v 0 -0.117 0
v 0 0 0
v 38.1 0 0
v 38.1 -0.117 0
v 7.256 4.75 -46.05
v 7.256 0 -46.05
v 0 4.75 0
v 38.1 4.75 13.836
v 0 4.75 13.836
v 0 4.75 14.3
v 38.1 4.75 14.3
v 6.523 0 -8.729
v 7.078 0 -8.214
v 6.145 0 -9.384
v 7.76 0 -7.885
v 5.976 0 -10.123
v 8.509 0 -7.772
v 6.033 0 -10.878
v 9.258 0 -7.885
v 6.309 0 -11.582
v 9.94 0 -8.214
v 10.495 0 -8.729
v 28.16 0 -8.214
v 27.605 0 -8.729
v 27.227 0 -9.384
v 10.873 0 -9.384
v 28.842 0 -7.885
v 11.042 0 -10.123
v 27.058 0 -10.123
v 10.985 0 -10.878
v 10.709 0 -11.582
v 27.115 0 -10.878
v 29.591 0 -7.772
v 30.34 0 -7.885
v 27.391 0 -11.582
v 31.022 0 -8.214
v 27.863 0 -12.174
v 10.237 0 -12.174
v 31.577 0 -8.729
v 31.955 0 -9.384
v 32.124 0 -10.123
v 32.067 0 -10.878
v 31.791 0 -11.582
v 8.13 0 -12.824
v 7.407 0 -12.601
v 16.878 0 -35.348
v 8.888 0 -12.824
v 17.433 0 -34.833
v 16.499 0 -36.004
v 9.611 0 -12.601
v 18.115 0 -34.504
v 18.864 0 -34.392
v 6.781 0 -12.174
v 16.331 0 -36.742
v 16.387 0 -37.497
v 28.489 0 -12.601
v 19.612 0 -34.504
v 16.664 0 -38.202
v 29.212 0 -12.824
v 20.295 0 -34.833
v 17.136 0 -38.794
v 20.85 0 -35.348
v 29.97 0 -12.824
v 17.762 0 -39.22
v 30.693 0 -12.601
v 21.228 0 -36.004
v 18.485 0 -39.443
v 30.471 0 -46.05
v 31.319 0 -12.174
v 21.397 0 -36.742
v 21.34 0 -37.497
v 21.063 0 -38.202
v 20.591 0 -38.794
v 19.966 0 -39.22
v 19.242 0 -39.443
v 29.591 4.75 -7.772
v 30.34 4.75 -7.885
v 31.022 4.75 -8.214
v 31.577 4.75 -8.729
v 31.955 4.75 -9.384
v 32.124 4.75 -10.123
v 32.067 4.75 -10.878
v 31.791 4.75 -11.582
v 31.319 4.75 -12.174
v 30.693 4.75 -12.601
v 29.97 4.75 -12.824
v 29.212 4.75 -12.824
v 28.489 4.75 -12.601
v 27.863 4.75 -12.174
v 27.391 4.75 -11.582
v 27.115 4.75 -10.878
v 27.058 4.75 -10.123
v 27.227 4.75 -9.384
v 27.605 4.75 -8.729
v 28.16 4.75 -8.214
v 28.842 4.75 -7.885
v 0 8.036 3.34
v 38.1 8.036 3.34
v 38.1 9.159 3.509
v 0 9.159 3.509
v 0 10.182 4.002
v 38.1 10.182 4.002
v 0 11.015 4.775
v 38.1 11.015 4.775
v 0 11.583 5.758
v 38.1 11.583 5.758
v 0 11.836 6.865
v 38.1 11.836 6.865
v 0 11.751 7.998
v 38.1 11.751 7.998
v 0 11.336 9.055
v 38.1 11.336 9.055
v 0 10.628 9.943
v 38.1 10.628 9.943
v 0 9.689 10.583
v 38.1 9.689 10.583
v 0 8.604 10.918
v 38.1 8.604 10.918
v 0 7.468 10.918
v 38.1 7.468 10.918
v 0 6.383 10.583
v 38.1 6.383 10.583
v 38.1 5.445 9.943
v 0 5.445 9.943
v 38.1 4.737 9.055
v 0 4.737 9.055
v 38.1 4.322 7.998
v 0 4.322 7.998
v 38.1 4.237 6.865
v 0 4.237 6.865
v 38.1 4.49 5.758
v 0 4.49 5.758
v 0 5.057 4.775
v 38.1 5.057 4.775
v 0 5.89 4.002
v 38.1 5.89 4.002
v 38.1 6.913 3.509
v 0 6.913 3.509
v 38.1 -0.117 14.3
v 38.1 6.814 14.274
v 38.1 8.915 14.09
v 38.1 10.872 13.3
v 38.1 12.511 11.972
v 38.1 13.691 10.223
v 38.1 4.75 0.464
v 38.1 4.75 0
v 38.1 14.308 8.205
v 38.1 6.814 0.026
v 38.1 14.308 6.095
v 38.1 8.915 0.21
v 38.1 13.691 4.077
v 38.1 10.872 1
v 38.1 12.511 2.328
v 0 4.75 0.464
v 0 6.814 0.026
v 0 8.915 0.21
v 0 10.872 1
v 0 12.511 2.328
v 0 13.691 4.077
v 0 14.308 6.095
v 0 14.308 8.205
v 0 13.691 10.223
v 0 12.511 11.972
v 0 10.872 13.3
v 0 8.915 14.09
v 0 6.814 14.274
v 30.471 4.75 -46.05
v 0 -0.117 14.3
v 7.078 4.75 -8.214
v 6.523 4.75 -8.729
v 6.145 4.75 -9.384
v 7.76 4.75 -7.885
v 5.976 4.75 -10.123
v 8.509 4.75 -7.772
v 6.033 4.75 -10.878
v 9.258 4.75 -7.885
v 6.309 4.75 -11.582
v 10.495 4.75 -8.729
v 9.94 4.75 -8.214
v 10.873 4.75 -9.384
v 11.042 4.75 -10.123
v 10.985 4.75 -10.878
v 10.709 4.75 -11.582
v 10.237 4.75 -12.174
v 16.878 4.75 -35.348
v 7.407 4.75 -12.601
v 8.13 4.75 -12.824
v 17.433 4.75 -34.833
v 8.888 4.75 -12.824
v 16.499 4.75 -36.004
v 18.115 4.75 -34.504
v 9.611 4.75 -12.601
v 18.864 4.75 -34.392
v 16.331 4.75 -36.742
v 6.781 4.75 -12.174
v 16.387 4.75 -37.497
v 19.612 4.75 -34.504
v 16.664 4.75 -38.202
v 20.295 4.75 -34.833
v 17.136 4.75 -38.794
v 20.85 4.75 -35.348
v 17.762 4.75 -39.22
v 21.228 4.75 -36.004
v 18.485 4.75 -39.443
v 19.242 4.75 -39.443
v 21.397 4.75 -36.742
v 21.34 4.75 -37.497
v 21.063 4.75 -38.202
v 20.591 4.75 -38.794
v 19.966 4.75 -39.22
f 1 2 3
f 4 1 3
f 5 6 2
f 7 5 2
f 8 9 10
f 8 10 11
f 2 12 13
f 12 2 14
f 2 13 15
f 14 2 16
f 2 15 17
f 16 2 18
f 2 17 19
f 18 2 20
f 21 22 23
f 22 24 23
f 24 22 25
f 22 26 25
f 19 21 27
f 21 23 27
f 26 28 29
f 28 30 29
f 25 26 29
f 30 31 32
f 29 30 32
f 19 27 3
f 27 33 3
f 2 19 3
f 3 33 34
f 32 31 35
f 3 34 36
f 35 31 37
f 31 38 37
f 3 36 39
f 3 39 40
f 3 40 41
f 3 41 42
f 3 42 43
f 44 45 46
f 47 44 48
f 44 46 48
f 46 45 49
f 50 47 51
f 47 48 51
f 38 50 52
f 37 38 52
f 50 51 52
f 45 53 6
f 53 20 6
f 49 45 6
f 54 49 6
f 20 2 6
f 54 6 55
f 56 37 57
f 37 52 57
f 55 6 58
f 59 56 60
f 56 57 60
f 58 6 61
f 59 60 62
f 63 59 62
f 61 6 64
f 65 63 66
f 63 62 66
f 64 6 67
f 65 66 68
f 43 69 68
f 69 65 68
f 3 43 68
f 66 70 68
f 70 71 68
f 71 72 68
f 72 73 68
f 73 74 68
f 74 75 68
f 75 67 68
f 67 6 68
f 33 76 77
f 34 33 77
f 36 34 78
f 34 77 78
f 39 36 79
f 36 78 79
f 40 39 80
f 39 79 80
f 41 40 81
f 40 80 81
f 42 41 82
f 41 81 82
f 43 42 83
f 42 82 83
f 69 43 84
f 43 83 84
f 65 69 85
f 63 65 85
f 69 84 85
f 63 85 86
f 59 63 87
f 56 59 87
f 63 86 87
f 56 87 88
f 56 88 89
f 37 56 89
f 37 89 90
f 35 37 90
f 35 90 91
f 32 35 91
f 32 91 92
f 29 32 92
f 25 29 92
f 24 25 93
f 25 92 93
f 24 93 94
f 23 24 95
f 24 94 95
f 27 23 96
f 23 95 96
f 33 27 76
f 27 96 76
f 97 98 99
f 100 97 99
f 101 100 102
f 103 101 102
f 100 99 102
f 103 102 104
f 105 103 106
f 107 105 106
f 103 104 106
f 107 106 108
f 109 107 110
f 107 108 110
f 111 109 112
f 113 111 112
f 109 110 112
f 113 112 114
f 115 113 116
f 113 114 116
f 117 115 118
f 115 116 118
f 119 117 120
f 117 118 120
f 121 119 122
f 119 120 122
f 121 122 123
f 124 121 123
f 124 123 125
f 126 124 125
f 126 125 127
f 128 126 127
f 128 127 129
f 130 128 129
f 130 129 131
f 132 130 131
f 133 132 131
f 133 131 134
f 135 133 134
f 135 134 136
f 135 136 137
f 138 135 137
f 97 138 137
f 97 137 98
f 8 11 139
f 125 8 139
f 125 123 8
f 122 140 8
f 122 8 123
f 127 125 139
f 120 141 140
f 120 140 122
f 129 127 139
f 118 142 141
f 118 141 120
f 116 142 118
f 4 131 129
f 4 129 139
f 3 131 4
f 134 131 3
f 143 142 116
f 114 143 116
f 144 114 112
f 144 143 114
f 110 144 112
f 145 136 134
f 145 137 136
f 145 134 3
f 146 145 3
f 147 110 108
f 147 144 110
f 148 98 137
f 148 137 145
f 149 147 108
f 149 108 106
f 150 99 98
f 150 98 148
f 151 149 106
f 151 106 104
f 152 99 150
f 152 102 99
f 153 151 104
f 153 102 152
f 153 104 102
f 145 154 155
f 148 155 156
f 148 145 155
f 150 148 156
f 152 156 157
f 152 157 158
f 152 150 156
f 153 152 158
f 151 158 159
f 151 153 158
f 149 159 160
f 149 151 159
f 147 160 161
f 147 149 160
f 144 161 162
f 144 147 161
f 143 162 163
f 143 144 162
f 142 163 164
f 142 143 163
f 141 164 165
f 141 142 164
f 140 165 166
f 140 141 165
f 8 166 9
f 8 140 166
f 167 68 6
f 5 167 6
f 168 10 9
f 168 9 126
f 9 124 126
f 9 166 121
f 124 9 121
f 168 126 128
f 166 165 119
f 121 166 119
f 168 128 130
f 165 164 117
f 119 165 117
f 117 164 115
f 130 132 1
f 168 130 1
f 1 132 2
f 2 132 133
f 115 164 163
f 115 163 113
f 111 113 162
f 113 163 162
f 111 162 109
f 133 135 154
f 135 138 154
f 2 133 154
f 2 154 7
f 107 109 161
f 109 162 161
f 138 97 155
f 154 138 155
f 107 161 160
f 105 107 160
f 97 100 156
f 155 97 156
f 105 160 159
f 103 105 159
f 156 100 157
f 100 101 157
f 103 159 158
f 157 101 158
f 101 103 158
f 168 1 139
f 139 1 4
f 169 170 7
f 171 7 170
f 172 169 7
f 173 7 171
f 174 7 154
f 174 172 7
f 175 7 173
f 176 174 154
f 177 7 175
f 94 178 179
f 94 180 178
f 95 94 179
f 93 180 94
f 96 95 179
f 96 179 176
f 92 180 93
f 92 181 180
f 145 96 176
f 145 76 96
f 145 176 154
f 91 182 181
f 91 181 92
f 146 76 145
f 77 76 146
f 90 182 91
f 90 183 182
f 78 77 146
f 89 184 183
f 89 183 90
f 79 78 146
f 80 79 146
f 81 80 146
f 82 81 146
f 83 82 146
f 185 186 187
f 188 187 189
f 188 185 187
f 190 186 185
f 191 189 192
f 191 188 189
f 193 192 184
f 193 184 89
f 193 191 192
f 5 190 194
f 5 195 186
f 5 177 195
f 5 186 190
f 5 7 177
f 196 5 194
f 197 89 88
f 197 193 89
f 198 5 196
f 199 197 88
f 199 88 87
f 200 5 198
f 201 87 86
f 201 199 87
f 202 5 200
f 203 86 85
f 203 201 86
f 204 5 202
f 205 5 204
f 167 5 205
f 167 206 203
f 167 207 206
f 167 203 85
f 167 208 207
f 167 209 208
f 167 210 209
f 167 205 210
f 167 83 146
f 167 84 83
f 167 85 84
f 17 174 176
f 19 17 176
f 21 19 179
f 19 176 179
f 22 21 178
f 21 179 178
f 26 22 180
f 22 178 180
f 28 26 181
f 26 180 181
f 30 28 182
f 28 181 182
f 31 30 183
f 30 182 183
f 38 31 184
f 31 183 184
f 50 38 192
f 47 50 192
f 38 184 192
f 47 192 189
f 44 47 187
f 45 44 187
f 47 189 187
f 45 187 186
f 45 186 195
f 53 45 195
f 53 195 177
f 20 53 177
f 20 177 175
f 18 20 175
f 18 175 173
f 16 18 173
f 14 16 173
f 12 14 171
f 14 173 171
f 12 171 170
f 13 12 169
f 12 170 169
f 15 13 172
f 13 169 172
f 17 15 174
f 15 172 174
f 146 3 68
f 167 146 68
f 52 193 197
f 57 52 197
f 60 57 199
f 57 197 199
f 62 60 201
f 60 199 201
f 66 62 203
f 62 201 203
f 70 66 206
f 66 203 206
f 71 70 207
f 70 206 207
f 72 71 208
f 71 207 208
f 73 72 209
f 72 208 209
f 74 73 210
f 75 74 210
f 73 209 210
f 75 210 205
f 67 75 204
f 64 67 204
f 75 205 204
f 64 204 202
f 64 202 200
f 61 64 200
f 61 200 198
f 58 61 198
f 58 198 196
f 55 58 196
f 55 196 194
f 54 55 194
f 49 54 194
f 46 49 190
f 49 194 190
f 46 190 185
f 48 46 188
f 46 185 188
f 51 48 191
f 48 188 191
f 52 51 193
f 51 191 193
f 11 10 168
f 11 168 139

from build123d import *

# Parameters (mm, degrees)
BOSS_EXTRUDE1_DEPTH = 4.7498
SKETCH2_R           = 2.54
CUT_EXTRUDE1_DEPTH  = 4.7498
SKETCH3_W           = 38.1
SKETCH3_H           = 4.866954954
BOSS_EXTRUDE2_DEPTH = 14.3002
SKETCH4_R           = 7.1374
BOSS_EXTRUDE3_DEPTH = 38.1
SKETCH5_R           = 3.81
CUT_EXTRUDE2_DEPTH  = 43.2562


with BuildPart() as part:
    # Sketch1 → Boss-Extrude1 (new body)
    with BuildSketch(Plane(origin=(0, 0, 0), x_dir=(1, 0, 0), z_dir=(0, 1, 0))):
        Polygon((0, 0), (38.1, 0), (30.471493689, 46.0502), (7.255893689, 46.0502), align=None)
    extrude(amount=BOSS_EXTRUDE1_DEPTH)

    # Sketch2 → Cut-Extrude1 (cut)
    with BuildSketch(Plane(origin=(0, 4.7498, 0), x_dir=(1, 0, 0), z_dir=(0, 1, 0))):
        with Locations(Location((18.863693689, 36.9316, 0), (0, 0, 270))):
            Circle(SKETCH2_R)
        with Locations(Location((8.509, 10.3124, 0), (0, 0, 270))):
            Circle(SKETCH2_R)
        with Locations(Location((29.591, 10.3124, 0), (0, 0, 270))):
            Circle(SKETCH2_R)
    extrude(amount=-CUT_EXTRUDE1_DEPTH, mode=Mode.SUBTRACT)

    # Sketch3 → Boss-Extrude2 (add)
    with BuildSketch(Plane.XY):
        with Locations((19.05, 2.316322523)):
            Rectangle(SKETCH3_W, SKETCH3_H)
    extrude(amount=BOSS_EXTRUDE2_DEPTH)

    # Sketch4 → Boss-Extrude3 (add)
    with BuildSketch(Plane(origin=(38.1, 0, 0), x_dir=(0, 0, -1), z_dir=(1, 0, 0))):
        with Locations((-7.1501, 7.248845046)):
            Circle(SKETCH4_R)
    extrude(amount=-BOSS_EXTRUDE3_DEPTH)

    # Sketch5 → Cut-Extrude2 (cut)
    with BuildSketch(Plane(origin=(38.1, 0, 0), x_dir=(0, 0, -1), z_dir=(1, 0, 0))):
        with Locations((-7.1501, 8.036245046)):
            Circle(SKETCH5_R)
    extrude(amount=-CUT_EXTRUDE2_DEPTH, mode=Mode.SUBTRACT)


solid = part.part
